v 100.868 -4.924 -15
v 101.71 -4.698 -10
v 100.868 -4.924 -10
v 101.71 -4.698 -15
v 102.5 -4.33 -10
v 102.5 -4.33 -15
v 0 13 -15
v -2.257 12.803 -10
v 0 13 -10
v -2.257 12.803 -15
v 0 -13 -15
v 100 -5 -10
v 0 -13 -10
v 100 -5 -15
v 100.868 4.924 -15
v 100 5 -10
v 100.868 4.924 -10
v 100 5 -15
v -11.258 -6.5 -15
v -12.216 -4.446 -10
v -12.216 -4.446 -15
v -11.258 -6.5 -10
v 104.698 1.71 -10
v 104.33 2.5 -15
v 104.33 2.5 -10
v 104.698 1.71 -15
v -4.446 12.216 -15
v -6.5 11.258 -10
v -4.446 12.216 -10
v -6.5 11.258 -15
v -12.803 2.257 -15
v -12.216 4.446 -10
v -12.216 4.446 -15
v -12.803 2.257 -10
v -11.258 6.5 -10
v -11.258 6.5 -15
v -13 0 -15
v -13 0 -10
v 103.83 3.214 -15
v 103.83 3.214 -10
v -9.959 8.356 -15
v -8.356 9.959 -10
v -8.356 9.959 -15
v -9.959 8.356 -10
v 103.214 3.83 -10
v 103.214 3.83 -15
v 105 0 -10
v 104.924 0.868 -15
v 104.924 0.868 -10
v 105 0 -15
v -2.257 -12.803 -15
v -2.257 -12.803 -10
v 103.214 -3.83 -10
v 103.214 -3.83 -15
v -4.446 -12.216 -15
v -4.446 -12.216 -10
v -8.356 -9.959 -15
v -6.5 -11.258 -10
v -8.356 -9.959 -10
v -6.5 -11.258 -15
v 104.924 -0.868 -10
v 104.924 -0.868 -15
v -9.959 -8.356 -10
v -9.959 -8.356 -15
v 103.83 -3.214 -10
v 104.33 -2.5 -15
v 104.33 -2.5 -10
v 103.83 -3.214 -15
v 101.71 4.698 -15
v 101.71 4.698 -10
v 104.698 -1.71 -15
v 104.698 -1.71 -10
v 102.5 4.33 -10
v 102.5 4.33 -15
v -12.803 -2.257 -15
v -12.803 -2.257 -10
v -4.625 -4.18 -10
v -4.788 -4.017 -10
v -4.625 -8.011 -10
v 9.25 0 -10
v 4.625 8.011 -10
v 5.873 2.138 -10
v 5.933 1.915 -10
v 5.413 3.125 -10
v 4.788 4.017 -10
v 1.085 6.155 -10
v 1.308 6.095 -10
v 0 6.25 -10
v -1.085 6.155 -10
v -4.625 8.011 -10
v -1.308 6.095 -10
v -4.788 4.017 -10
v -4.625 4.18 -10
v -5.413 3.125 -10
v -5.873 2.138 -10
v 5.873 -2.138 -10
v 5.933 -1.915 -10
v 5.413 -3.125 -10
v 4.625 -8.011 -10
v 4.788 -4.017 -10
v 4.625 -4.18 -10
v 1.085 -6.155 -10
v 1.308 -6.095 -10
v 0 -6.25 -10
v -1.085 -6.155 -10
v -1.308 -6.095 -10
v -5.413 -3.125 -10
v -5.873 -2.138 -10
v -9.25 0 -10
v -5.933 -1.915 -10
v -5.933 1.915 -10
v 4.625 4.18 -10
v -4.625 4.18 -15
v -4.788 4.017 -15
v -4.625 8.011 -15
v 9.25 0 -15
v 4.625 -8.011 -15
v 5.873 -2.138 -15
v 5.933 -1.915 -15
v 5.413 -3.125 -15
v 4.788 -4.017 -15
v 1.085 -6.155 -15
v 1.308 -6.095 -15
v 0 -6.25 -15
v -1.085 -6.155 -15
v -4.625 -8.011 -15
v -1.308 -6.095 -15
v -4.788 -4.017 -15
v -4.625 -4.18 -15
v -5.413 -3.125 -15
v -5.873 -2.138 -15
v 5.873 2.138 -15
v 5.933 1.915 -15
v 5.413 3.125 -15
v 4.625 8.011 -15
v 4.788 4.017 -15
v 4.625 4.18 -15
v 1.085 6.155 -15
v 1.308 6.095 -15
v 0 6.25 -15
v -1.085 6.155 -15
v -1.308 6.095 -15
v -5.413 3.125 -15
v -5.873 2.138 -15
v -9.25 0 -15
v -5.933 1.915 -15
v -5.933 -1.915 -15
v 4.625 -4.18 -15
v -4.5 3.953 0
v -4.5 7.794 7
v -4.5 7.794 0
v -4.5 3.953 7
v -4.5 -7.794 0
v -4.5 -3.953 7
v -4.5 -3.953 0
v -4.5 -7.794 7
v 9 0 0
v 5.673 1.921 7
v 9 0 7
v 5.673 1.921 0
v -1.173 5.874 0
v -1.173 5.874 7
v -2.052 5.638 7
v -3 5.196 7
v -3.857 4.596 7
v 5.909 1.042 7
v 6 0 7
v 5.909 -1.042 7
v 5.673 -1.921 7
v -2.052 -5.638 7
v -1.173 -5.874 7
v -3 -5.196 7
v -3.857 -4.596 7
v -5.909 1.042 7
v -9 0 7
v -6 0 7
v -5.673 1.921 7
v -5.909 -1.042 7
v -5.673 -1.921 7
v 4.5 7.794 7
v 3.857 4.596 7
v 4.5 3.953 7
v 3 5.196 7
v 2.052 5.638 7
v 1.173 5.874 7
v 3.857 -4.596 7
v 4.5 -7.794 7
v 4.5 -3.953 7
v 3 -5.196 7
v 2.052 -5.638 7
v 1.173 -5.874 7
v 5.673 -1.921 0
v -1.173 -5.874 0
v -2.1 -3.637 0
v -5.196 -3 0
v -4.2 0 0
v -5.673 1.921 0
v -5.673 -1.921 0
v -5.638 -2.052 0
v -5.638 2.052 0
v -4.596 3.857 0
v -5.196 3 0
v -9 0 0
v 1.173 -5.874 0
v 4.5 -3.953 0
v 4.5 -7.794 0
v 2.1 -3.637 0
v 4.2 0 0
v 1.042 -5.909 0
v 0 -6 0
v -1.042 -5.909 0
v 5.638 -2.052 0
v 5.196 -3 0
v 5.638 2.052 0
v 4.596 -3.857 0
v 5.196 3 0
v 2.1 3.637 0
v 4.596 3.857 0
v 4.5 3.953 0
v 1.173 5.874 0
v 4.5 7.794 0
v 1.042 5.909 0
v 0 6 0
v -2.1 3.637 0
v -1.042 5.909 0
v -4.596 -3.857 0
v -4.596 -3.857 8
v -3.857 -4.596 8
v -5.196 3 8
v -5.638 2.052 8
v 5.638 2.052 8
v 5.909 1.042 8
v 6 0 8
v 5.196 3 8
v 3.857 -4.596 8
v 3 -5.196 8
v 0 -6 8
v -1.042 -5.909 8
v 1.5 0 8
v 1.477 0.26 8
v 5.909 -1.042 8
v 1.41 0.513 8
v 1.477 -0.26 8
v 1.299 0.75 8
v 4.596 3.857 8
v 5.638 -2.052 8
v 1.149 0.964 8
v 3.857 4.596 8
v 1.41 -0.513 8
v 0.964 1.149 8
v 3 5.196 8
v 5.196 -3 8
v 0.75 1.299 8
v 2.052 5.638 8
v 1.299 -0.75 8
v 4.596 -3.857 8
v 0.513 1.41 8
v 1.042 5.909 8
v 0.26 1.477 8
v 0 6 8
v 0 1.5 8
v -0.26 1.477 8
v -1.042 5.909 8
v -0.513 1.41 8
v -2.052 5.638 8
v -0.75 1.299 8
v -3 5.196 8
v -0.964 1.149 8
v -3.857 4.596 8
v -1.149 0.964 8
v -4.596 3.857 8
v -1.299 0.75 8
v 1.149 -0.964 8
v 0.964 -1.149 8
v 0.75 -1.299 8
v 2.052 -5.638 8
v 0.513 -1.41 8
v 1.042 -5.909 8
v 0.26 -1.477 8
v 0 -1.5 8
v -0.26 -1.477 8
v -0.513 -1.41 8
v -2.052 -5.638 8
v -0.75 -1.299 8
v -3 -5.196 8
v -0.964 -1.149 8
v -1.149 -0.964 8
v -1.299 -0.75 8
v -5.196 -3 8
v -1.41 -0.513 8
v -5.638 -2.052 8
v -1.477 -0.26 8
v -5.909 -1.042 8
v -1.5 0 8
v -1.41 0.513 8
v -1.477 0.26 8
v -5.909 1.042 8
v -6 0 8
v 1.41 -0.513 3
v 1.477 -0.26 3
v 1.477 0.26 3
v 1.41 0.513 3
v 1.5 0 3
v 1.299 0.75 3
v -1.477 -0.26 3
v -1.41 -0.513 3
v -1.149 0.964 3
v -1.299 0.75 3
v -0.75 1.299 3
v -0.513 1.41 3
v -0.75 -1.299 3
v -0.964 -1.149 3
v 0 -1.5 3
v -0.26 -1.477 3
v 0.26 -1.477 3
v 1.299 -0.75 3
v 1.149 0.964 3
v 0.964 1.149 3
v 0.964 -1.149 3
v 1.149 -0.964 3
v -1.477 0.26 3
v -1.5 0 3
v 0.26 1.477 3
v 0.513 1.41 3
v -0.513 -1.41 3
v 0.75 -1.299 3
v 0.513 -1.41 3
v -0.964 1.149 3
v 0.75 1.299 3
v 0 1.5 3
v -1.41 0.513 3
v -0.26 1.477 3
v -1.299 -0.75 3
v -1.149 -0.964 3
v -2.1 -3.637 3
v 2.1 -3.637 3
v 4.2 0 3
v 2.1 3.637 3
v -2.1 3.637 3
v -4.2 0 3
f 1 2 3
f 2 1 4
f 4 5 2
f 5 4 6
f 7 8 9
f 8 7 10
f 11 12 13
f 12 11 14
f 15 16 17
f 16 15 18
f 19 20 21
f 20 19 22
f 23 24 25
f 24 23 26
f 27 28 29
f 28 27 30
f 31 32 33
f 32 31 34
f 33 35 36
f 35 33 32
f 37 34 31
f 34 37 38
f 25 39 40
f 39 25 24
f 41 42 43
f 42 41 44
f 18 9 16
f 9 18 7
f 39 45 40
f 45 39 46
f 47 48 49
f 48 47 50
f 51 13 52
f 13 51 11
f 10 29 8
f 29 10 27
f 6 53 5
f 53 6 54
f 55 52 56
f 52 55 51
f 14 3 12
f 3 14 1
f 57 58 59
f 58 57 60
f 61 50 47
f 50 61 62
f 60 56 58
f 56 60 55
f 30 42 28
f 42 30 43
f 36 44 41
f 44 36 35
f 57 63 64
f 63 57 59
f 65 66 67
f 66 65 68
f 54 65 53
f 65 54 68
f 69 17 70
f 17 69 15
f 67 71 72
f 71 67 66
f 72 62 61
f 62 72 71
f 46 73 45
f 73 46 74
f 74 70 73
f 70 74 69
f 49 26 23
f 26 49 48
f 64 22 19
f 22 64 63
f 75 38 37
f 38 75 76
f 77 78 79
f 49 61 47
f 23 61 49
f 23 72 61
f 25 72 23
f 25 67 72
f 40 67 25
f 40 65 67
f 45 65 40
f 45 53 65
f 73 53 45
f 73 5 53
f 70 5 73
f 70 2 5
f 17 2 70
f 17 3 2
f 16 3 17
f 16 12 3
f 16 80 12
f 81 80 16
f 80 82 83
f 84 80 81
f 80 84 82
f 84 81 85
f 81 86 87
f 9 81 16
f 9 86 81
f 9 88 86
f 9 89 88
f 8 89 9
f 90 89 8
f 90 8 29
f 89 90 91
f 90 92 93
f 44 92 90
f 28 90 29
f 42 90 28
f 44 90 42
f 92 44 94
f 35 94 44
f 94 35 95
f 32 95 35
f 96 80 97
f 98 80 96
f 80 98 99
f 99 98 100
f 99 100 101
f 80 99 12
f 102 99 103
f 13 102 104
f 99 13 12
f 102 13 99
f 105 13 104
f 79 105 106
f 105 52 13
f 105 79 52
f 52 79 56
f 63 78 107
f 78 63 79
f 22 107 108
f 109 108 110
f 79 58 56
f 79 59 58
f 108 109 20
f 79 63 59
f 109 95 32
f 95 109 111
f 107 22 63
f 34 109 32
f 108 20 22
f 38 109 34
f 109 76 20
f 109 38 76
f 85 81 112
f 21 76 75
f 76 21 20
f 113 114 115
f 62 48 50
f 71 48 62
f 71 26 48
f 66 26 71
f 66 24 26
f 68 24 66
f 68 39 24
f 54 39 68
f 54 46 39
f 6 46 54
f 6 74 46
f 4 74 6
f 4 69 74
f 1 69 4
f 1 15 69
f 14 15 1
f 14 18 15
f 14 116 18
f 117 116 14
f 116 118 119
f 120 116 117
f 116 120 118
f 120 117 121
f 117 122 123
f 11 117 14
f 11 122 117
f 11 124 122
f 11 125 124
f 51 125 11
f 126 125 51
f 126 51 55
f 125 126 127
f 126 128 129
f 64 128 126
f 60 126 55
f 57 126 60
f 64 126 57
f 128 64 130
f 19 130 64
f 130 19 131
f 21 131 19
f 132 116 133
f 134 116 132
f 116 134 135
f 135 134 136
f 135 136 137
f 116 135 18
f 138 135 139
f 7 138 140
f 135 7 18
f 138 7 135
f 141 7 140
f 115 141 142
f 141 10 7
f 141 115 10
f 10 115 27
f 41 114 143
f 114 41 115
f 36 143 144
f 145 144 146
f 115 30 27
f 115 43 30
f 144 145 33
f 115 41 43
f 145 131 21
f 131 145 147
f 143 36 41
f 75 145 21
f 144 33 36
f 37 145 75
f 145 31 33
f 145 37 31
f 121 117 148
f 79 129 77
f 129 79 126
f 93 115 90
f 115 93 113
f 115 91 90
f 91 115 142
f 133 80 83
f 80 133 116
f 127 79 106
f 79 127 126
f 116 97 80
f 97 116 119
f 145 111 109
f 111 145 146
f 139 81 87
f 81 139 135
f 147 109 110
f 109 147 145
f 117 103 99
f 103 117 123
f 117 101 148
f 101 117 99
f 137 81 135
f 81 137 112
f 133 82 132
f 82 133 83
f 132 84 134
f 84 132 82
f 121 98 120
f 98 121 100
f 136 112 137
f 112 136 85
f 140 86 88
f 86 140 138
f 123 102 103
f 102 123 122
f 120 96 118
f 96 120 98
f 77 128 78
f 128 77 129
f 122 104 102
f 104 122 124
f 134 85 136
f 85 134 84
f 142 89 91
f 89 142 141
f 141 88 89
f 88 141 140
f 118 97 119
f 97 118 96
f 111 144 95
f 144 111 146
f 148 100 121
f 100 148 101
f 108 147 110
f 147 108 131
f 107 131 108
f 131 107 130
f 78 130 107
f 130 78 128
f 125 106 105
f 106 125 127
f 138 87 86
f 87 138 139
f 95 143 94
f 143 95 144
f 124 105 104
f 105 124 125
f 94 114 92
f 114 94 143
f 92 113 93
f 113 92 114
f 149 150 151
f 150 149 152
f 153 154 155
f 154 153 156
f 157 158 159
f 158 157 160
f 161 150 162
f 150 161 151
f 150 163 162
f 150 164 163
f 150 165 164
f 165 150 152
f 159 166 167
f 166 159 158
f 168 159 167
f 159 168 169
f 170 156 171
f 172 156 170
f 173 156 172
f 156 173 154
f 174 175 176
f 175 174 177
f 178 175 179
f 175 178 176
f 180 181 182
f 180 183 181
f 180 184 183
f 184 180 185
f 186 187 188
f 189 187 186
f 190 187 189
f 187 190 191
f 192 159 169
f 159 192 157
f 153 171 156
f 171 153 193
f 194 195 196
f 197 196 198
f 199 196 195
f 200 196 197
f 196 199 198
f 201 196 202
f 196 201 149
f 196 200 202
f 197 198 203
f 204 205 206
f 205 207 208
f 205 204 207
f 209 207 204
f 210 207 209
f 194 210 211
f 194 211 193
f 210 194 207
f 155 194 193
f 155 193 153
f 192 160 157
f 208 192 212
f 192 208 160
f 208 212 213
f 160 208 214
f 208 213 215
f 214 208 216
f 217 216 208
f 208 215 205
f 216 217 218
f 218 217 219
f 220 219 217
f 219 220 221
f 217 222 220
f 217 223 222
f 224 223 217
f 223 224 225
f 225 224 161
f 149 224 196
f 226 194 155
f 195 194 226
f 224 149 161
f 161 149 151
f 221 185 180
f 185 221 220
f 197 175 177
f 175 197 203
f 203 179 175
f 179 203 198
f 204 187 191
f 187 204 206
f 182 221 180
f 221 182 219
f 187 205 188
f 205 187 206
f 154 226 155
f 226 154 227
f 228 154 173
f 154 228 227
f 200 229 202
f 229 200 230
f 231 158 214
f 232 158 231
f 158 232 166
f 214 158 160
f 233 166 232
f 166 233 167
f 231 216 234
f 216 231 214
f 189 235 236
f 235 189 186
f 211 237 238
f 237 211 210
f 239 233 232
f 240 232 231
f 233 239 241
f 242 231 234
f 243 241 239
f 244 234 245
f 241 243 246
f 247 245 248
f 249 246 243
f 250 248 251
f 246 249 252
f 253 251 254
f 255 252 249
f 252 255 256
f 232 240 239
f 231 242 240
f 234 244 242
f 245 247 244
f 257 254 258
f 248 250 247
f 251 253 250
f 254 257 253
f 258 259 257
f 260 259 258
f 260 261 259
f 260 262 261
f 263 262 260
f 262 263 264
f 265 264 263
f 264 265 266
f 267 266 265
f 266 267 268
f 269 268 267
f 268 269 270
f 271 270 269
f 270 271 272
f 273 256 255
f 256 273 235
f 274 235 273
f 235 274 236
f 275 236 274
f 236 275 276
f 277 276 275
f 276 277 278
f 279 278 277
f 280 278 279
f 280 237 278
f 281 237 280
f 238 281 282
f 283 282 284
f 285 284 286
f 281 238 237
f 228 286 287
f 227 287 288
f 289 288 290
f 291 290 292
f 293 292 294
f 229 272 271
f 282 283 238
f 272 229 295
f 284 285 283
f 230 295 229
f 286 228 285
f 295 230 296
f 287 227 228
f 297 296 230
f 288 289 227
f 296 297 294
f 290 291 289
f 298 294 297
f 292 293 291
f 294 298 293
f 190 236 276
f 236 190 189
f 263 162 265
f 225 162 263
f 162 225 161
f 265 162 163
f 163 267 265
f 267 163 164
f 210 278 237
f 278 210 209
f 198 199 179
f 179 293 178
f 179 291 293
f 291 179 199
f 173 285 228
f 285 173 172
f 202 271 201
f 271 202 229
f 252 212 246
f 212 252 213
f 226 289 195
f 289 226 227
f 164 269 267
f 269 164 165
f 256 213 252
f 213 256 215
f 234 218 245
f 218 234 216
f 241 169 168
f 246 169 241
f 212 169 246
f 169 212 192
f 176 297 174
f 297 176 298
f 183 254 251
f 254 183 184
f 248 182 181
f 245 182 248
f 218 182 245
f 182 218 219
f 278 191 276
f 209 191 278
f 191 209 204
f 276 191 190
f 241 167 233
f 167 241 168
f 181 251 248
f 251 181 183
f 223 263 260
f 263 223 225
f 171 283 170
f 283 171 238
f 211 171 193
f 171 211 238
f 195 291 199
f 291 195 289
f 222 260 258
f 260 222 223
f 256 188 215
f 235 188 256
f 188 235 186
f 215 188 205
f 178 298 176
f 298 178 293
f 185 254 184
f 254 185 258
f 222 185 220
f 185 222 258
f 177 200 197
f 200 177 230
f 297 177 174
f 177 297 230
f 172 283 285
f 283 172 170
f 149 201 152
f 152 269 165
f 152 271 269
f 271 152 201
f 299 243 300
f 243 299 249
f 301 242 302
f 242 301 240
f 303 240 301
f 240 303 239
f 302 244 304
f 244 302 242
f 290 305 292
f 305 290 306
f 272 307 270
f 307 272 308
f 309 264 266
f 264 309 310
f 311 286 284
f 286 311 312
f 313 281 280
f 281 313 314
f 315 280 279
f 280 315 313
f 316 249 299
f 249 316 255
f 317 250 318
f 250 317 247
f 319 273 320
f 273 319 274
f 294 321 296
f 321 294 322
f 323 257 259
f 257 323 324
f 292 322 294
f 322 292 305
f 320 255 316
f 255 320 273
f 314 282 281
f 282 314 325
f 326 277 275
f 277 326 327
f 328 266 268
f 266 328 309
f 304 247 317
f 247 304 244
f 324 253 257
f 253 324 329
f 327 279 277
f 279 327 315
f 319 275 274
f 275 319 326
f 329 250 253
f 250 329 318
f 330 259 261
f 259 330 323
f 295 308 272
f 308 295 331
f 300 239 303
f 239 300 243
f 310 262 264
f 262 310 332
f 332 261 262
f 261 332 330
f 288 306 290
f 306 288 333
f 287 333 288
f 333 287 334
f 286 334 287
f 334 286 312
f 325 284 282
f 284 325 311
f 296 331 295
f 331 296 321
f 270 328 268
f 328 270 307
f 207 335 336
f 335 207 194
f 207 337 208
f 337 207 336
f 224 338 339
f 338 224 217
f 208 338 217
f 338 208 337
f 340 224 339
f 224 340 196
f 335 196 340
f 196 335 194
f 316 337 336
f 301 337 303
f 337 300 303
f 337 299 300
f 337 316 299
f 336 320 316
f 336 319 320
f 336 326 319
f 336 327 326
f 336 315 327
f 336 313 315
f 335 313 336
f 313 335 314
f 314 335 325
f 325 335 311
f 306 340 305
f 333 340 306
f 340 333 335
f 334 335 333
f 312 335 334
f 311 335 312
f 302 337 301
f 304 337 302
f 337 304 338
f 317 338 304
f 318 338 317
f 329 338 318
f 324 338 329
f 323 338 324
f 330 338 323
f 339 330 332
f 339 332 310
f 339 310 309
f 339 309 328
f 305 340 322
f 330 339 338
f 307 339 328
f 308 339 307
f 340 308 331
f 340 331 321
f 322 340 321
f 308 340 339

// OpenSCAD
$fn=36;

Tool_or_Nut=3;      //Rendering    1=Tool   2=Nut      3=Assembly both
Adjustment_nut_diameter=18;
Adjustment_nut_heigth=7;
Adjustment_nut_shape=3;
Adjustment_nut_double_shape=1;
Tool_handle_length=100;
Tool_heigth=5;
Tolerance=0.25;
Screw_hole_diameter=3;
Screw_nut_size=7;
Screw_nut_heigth=3;

if(Tool_or_Nut==1 || Tool_or_Nut==3)
translate([0,0,-15])
difference()
   {
   hull()
      {
        cylinder(r=Adjustment_nut_diameter/2+4,h=Tool_heigth);
        translate([Tool_handle_length,0,0])
            cylinder(r=5,h=Tool_heigth);
      }
        translate([0,0,-Tolerance])
            cylinder(r=Adjustment_nut_diameter/2+Tolerance,h=Adjustment_nut_heigth+Tolerance*2,$fn=Adjustment_nut_shape);
        if(Adjustment_nut_double_shape==1)
            translate([0,0,-Tolerance])
                rotate([0,0,360/Adjustment_nut_shape/2])
                    cylinder(r=Adjustment_nut_diameter/2+Tolerance,h=Adjustment_nut_heigth+Tolerance*2,$fn=Adjustment_nut_shape);
        translate([0,0,-Tolerance])
            cylinder(r=Adjustment_nut_diameter/2-3+Tolerance,h=Adjustment_nut_heigth+1+Tolerance*2);
    }

if(Tool_or_Nut==2 || Tool_or_Nut==3)
difference()
   {
   union()
      {
        cylinder(r=Adjustment_nut_diameter/2,h=Adjustment_nut_heigth,$fn=Adjustment_nut_shape);
        if(Adjustment_nut_double_shape==1)
            rotate([0,0,360/Adjustment_nut_shape/2])
                cylinder(r=Adjustment_nut_diameter/2,h=Adjustment_nut_heigth,$fn=Adjustment_nut_shape);
        cylinder(r=Adjustment_nut_diameter/2-3,h=Adjustment_nut_heigth+1);
      }

     translate([0,0,-1])
        cylinder(r=Screw_hole_diameter/2,h=Adjustment_nut_heigth*2);


     translate([0,0,-1])
        cylinder(r=Screw_nut_size/2*1.2,h=Screw_nut_heigth+1,$fn=6);


   }
